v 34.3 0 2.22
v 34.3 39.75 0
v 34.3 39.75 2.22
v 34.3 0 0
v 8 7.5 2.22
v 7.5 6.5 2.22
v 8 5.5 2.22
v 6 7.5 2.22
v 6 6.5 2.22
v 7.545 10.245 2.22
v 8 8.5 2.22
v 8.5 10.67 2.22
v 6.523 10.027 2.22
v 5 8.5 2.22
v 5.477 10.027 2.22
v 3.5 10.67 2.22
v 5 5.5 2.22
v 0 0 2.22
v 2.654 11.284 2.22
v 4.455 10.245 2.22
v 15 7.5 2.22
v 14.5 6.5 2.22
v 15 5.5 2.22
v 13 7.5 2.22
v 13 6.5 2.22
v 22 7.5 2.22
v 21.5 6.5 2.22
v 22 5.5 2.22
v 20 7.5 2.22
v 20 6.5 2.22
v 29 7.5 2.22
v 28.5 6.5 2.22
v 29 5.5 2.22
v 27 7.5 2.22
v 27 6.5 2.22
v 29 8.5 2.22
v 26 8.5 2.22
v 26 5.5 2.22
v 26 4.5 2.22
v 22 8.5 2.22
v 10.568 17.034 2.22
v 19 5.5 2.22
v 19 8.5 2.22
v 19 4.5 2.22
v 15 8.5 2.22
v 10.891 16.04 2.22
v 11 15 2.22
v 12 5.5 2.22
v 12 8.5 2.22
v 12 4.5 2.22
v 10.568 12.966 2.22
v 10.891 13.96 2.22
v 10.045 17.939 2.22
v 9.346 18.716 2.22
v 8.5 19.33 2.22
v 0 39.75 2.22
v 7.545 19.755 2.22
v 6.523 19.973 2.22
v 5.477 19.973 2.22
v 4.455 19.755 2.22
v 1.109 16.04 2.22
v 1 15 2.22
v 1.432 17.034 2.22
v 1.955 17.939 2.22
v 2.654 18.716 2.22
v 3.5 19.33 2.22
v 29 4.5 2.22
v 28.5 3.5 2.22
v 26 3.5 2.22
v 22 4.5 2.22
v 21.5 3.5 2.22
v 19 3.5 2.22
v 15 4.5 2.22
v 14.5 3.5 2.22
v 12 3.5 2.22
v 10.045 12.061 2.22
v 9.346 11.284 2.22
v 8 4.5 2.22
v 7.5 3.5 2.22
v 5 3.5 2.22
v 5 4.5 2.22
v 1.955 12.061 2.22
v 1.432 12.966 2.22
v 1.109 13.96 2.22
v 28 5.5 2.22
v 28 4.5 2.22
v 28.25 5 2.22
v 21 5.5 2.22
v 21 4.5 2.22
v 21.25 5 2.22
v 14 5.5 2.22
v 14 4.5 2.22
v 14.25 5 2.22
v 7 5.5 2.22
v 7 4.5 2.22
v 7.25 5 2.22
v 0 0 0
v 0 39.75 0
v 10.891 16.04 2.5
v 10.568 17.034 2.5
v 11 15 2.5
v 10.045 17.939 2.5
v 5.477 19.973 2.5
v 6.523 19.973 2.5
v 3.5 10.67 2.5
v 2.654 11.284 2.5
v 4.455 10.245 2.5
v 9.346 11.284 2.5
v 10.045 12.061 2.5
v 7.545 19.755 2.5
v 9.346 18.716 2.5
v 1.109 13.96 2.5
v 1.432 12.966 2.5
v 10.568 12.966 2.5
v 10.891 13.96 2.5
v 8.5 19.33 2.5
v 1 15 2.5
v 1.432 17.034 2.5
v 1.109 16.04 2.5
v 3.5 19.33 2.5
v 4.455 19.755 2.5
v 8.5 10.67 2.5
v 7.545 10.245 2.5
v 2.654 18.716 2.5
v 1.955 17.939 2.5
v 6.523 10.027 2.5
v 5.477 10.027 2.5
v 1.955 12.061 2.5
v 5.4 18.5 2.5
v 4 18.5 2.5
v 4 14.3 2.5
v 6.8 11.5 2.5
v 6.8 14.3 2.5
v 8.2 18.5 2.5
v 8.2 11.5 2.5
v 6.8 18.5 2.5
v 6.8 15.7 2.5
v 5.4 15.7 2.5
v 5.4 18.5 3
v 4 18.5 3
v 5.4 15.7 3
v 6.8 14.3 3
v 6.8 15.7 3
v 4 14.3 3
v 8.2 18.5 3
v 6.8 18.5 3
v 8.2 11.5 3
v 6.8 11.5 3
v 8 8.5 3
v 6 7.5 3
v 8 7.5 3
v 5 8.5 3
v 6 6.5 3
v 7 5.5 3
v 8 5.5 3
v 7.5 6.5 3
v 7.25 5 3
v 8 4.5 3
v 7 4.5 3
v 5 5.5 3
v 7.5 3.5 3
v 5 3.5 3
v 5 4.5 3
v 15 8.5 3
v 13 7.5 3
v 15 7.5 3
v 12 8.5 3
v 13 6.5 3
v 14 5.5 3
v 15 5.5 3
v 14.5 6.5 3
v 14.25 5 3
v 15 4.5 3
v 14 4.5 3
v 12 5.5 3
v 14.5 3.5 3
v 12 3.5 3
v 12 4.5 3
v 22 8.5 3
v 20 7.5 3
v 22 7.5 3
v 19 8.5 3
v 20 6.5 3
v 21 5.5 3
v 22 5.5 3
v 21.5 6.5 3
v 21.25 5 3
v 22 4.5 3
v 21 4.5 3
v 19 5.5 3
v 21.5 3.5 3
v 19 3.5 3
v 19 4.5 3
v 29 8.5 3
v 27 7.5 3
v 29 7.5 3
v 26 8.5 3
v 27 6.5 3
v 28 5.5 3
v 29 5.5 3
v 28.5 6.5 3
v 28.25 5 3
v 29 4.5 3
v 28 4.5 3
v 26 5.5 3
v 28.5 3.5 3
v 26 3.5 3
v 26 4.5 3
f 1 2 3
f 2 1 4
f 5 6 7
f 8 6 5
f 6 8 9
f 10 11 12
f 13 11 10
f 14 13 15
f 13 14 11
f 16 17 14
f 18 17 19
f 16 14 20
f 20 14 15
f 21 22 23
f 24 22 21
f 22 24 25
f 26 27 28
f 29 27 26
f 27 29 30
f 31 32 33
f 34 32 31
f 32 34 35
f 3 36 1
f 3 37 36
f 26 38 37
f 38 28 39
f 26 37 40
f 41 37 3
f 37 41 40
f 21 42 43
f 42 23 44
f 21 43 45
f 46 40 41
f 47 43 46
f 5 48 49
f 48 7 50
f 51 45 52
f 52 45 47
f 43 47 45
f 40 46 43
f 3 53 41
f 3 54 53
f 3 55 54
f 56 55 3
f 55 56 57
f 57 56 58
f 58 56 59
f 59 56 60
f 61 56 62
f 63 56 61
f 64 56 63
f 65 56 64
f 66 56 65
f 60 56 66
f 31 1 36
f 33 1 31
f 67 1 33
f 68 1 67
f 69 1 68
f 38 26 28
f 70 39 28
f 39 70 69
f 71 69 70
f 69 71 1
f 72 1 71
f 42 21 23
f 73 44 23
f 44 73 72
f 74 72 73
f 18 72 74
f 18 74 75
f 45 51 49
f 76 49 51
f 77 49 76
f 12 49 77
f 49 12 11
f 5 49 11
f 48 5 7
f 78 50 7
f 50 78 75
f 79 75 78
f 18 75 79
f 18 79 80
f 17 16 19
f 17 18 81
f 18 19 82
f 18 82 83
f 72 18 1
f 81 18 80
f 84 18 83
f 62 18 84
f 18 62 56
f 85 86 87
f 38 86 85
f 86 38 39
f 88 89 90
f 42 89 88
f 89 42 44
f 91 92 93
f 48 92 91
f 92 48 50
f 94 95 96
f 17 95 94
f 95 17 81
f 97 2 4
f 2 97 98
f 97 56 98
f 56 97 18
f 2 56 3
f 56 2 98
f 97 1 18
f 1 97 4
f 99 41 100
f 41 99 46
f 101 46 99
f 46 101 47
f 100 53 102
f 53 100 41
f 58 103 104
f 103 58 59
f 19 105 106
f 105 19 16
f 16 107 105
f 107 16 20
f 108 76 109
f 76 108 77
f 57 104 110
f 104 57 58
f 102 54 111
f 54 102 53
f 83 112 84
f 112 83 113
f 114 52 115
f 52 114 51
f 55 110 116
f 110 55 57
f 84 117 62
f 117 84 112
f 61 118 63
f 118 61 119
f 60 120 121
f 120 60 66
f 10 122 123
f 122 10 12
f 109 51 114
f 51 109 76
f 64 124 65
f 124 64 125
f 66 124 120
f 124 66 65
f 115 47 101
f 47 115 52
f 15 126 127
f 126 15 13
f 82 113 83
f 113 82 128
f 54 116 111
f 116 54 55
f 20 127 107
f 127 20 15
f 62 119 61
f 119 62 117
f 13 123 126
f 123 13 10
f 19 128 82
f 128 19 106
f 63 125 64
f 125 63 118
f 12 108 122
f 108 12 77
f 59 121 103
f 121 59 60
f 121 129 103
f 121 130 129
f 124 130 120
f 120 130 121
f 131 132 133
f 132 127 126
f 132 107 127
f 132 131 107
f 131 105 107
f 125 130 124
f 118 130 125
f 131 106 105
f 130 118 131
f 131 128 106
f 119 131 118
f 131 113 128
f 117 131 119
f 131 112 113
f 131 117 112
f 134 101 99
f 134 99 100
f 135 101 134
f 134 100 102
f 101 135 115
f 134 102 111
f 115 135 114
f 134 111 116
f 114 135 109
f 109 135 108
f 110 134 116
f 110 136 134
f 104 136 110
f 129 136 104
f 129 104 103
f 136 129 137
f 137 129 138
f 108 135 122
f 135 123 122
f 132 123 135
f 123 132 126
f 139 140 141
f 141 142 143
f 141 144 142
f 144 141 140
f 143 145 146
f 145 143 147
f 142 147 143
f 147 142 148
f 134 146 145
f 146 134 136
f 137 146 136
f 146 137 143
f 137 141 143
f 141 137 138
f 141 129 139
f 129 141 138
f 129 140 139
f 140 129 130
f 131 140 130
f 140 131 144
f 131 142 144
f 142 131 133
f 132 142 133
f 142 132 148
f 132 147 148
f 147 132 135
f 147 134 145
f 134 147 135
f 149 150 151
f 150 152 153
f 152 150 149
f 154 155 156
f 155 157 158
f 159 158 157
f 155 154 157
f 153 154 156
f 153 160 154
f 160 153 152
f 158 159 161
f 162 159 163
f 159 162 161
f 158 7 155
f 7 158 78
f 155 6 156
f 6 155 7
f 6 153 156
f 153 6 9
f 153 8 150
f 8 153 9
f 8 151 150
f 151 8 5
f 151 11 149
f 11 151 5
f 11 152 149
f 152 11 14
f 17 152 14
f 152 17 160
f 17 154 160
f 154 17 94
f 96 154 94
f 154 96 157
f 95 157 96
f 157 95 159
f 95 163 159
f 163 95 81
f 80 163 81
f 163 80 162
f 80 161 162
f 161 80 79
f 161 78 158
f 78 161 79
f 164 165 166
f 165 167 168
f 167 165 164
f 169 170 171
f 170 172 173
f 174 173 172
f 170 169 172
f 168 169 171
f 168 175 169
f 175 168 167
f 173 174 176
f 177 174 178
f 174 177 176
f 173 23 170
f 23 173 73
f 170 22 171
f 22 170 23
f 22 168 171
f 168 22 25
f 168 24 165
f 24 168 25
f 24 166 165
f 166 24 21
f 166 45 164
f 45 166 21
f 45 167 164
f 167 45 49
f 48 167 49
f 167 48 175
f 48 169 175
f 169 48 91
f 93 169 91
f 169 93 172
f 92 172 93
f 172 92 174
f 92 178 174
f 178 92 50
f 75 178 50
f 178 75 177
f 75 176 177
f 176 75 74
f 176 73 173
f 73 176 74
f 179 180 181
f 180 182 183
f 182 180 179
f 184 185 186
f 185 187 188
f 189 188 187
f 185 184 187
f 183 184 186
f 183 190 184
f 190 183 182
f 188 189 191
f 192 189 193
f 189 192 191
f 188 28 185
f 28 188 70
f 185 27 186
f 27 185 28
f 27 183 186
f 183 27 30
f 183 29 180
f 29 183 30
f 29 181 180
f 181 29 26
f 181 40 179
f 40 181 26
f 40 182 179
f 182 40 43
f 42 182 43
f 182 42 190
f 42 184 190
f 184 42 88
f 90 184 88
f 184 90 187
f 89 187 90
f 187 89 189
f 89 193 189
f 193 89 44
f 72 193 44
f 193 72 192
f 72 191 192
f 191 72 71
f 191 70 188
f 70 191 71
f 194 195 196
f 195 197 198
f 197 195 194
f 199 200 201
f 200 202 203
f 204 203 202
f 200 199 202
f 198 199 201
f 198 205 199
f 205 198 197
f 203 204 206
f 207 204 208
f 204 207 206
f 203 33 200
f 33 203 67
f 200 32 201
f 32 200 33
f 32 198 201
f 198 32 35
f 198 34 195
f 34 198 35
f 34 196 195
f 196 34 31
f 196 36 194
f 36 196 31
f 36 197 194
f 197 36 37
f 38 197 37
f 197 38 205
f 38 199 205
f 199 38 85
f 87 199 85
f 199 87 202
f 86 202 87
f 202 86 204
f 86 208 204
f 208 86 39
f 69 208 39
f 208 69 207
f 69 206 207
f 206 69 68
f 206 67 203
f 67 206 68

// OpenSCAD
/* dial.scad
 *
 * Copyright (C) Robert B. Ross, 2014
 *
 * This software is released under the Creative Commons
 * Attribution-ShareAlike 4.0 International Public License.
 *
 * Spiff Sans code from Stuart P. Bentley <stuart@testtrack4.com>, downloaded 
 * 9/26/2014, released under the Creative Commons - Public Domain Dedication
 * license.
 *
 * TODO:
 *
 */

/* [Global] */
Pilot_Skill    = 4; // [0:11]
Primary_Weapon = 3; // [0:5]
Agility        = 2; // [0:5]
Hull           = 3; // [0:14]
Shield         = 2; // [0:10]

/* [Hidden] */
$fn=30;

union() {
    cube([34.3,39.75,2.22]);

    translate([6,15,0]) cylinder(h=2.5,r=5);
    translate([4,11.5,1.5]) scale([0.7,0.7,1]) linear_extrude(height=1.5)
	write("4");

    translate([5,3.5,1.5]) scale([0.5,0.5,1]) linear_extrude(height=1.5)
	write("5");
    translate([12,3.5,1.5]) scale([0.5,0.5,1]) linear_extrude(height=1.5)
	write("5");
    translate([19,3.5,1.5]) scale([0.5,0.5,1]) linear_extrude(height=1.5)
	write("5");
    translate([26,3.5,1.5]) scale([0.5,0.5,1]) linear_extrude(height=1.5)
	write("5");
}

/******** BEGIN SPIFF SANS MODULES ********/

// Spiff Sans
// Author: Stuart P. Bentley <stuart@testtrack4.com>
// Version: 2.1.0

spiffsans = [
  ["",10,[[[0,5],[5,0],[10,5],[5,10],[4.5,8],[5.5,8],[6.75,6.75],[6.75,5.75],[5.5,4.5],[5.5,3.75],[4.5,3.75],[4.5,4.75],[5.75,6],[5.75,6.5],[5.25,7],[4.75,7],[4.25,6.5],[4.25,6],[3.25,6],[3.25,6.75],[4.5,3],[5.5,3],[5.5,2],[4.5,2]],[[0,1,2,3],[4,5,6,7,8,9,10,11,12,13,14,15,16,17,18,19],[20,21,22,23]]]],
  ["0",6,[[[5,0],[1,0],[0,2],[0,8],[1,10],[5,10],[6,8],[6,2],[2,8],[2,5],[4,8],[2,2],[4,2],[4,5]],[[0,1,2,3,4,5,6,7],[8,9,10],[11,12,13]]]],
  ["1",5,[[[0,0],[0,2],[2,2],[2,7],[0,7],[2,10],[4,10],[4,2],[5,2],[5,0]],[[0,1,2,3,4,5,6,7,8,9]]]],
  ["2",6,[[[0,0],[0,2],[4,6],[4,8],[2,8],[2,6],[0,6],[0,8],[1,10],[5,10],[6,8],[6,5.5],[2.5,2],[6,2],[6,0]],[[0,1,2,3,4,5,6,7,8,9,10,11,12,13,14]]]],
  ["3",6,[[[1,0],[0,2],[0,4],[2,4],[2,2],[4,2],[4,4],[3,4],[3,6],[4,6],[4,8],[2,8],[2,6],[0,6],[0,8],[1,10],[5,10],[6,8],[6,6],[5.5,5],[6,4],[6,2],[5,0]],[[0,1,2,3,4,5,6,7,8,9,10,11,12,13,14,15,16,17,18,19,20,21,22]]]],
  ["4",6,[[[4,0],[4,4],[0,4],[0,10],[2,10],[2,6],[4,6],[4,10],[6,10],[6,0]],[[0,1,2,3,4,5,6,7,8,9]]]],
  ["5",6,[[[0,0],[0,2],[4,2],[4.5,3],[4,4],[0,4],[0,10],[6,10],[6,8],[2,8],[2,6],[5,6],[6,4],[6,2],[5,0]],[[0,1,2,3,4,5,6,7,8,9,10,11,12,13,14]]]],
  ["6",6,[[[1,0],[0,2],[0,8],[1,10],[5,10],[5.5,8],[2,8],[2,6],[5,6],[6,4],[6,2],[5,0],[2,2],[4,2],[4,4],[2,4]],[[0,1,2,3,4,5,6,7,8,9,10,11],[12,13,14,15]]]],
  ["7",5,[[[1,0],[1,3],[3,8],[0,8],[0,10],[5,10],[5,8],[3,3],[3,0]],[[0,1,2,3,4,5,6,7,8]]]],
  ["8",6,[[[1,0],[0,2],[0,4],[0.5,5],[0,6],[0,8],[1,10],[5,10],[6,8],[6,6],[5.5,5],[6,4],[6,2],[5,0],[2,6],[4,6],[4,8],[2,8],[2,2],[4,2],[4,4],[2,4]],[[0,1,2,3,4,5,6,7,8,9,10,11,12,13],[14,15,16,17],[18,19,20,21]]]],
  ["9",6,[[[1,0],[0,2],[4,2],[4,4],[1,4],[0,6],[0,8],[1,10],[5,10],[6,8],[6,2],[5,0],[2,6],[4,6],[4,8],[2,8]],[[0,1,2,3,4,5,6,7,8,9,10,11],[12,13,14,15]]]]
];

module write(string,font=spiffsans,spacing=1,i=0) {
  if (i < len(string)) {
    assign(charindex = search(string[i],font,1)[0])
    
    // If the character is in the font
    if (charindex != undef) {
      assign(glyph = font[charindex][2])
      if (glyph){
        polygon(points=glyph[0], paths=glyph[1]);
      }
      translate([font[charindex][1] + spacing, 0, 0])
        write(string, font, spacing, i=i+1);
    } else {
      assign(glyph = font[0][2])
      if (glyph){
        polygon(points=glyph[0], paths=glyph[1]);
      }
      translate([font[0][1] + spacing,0,0])
        write(string, font, spacing, i=i+1);
    }
  }
}

/******** END SPIFF SANS MODULES ********/

/*
 * Local variables:
 *  mode: C
 *  c-indent-level: 4
 *  c-basic-offset: 4
 * End:
 *
 * vim: ts=8 sts=4 sw=4 expandtab
 */
